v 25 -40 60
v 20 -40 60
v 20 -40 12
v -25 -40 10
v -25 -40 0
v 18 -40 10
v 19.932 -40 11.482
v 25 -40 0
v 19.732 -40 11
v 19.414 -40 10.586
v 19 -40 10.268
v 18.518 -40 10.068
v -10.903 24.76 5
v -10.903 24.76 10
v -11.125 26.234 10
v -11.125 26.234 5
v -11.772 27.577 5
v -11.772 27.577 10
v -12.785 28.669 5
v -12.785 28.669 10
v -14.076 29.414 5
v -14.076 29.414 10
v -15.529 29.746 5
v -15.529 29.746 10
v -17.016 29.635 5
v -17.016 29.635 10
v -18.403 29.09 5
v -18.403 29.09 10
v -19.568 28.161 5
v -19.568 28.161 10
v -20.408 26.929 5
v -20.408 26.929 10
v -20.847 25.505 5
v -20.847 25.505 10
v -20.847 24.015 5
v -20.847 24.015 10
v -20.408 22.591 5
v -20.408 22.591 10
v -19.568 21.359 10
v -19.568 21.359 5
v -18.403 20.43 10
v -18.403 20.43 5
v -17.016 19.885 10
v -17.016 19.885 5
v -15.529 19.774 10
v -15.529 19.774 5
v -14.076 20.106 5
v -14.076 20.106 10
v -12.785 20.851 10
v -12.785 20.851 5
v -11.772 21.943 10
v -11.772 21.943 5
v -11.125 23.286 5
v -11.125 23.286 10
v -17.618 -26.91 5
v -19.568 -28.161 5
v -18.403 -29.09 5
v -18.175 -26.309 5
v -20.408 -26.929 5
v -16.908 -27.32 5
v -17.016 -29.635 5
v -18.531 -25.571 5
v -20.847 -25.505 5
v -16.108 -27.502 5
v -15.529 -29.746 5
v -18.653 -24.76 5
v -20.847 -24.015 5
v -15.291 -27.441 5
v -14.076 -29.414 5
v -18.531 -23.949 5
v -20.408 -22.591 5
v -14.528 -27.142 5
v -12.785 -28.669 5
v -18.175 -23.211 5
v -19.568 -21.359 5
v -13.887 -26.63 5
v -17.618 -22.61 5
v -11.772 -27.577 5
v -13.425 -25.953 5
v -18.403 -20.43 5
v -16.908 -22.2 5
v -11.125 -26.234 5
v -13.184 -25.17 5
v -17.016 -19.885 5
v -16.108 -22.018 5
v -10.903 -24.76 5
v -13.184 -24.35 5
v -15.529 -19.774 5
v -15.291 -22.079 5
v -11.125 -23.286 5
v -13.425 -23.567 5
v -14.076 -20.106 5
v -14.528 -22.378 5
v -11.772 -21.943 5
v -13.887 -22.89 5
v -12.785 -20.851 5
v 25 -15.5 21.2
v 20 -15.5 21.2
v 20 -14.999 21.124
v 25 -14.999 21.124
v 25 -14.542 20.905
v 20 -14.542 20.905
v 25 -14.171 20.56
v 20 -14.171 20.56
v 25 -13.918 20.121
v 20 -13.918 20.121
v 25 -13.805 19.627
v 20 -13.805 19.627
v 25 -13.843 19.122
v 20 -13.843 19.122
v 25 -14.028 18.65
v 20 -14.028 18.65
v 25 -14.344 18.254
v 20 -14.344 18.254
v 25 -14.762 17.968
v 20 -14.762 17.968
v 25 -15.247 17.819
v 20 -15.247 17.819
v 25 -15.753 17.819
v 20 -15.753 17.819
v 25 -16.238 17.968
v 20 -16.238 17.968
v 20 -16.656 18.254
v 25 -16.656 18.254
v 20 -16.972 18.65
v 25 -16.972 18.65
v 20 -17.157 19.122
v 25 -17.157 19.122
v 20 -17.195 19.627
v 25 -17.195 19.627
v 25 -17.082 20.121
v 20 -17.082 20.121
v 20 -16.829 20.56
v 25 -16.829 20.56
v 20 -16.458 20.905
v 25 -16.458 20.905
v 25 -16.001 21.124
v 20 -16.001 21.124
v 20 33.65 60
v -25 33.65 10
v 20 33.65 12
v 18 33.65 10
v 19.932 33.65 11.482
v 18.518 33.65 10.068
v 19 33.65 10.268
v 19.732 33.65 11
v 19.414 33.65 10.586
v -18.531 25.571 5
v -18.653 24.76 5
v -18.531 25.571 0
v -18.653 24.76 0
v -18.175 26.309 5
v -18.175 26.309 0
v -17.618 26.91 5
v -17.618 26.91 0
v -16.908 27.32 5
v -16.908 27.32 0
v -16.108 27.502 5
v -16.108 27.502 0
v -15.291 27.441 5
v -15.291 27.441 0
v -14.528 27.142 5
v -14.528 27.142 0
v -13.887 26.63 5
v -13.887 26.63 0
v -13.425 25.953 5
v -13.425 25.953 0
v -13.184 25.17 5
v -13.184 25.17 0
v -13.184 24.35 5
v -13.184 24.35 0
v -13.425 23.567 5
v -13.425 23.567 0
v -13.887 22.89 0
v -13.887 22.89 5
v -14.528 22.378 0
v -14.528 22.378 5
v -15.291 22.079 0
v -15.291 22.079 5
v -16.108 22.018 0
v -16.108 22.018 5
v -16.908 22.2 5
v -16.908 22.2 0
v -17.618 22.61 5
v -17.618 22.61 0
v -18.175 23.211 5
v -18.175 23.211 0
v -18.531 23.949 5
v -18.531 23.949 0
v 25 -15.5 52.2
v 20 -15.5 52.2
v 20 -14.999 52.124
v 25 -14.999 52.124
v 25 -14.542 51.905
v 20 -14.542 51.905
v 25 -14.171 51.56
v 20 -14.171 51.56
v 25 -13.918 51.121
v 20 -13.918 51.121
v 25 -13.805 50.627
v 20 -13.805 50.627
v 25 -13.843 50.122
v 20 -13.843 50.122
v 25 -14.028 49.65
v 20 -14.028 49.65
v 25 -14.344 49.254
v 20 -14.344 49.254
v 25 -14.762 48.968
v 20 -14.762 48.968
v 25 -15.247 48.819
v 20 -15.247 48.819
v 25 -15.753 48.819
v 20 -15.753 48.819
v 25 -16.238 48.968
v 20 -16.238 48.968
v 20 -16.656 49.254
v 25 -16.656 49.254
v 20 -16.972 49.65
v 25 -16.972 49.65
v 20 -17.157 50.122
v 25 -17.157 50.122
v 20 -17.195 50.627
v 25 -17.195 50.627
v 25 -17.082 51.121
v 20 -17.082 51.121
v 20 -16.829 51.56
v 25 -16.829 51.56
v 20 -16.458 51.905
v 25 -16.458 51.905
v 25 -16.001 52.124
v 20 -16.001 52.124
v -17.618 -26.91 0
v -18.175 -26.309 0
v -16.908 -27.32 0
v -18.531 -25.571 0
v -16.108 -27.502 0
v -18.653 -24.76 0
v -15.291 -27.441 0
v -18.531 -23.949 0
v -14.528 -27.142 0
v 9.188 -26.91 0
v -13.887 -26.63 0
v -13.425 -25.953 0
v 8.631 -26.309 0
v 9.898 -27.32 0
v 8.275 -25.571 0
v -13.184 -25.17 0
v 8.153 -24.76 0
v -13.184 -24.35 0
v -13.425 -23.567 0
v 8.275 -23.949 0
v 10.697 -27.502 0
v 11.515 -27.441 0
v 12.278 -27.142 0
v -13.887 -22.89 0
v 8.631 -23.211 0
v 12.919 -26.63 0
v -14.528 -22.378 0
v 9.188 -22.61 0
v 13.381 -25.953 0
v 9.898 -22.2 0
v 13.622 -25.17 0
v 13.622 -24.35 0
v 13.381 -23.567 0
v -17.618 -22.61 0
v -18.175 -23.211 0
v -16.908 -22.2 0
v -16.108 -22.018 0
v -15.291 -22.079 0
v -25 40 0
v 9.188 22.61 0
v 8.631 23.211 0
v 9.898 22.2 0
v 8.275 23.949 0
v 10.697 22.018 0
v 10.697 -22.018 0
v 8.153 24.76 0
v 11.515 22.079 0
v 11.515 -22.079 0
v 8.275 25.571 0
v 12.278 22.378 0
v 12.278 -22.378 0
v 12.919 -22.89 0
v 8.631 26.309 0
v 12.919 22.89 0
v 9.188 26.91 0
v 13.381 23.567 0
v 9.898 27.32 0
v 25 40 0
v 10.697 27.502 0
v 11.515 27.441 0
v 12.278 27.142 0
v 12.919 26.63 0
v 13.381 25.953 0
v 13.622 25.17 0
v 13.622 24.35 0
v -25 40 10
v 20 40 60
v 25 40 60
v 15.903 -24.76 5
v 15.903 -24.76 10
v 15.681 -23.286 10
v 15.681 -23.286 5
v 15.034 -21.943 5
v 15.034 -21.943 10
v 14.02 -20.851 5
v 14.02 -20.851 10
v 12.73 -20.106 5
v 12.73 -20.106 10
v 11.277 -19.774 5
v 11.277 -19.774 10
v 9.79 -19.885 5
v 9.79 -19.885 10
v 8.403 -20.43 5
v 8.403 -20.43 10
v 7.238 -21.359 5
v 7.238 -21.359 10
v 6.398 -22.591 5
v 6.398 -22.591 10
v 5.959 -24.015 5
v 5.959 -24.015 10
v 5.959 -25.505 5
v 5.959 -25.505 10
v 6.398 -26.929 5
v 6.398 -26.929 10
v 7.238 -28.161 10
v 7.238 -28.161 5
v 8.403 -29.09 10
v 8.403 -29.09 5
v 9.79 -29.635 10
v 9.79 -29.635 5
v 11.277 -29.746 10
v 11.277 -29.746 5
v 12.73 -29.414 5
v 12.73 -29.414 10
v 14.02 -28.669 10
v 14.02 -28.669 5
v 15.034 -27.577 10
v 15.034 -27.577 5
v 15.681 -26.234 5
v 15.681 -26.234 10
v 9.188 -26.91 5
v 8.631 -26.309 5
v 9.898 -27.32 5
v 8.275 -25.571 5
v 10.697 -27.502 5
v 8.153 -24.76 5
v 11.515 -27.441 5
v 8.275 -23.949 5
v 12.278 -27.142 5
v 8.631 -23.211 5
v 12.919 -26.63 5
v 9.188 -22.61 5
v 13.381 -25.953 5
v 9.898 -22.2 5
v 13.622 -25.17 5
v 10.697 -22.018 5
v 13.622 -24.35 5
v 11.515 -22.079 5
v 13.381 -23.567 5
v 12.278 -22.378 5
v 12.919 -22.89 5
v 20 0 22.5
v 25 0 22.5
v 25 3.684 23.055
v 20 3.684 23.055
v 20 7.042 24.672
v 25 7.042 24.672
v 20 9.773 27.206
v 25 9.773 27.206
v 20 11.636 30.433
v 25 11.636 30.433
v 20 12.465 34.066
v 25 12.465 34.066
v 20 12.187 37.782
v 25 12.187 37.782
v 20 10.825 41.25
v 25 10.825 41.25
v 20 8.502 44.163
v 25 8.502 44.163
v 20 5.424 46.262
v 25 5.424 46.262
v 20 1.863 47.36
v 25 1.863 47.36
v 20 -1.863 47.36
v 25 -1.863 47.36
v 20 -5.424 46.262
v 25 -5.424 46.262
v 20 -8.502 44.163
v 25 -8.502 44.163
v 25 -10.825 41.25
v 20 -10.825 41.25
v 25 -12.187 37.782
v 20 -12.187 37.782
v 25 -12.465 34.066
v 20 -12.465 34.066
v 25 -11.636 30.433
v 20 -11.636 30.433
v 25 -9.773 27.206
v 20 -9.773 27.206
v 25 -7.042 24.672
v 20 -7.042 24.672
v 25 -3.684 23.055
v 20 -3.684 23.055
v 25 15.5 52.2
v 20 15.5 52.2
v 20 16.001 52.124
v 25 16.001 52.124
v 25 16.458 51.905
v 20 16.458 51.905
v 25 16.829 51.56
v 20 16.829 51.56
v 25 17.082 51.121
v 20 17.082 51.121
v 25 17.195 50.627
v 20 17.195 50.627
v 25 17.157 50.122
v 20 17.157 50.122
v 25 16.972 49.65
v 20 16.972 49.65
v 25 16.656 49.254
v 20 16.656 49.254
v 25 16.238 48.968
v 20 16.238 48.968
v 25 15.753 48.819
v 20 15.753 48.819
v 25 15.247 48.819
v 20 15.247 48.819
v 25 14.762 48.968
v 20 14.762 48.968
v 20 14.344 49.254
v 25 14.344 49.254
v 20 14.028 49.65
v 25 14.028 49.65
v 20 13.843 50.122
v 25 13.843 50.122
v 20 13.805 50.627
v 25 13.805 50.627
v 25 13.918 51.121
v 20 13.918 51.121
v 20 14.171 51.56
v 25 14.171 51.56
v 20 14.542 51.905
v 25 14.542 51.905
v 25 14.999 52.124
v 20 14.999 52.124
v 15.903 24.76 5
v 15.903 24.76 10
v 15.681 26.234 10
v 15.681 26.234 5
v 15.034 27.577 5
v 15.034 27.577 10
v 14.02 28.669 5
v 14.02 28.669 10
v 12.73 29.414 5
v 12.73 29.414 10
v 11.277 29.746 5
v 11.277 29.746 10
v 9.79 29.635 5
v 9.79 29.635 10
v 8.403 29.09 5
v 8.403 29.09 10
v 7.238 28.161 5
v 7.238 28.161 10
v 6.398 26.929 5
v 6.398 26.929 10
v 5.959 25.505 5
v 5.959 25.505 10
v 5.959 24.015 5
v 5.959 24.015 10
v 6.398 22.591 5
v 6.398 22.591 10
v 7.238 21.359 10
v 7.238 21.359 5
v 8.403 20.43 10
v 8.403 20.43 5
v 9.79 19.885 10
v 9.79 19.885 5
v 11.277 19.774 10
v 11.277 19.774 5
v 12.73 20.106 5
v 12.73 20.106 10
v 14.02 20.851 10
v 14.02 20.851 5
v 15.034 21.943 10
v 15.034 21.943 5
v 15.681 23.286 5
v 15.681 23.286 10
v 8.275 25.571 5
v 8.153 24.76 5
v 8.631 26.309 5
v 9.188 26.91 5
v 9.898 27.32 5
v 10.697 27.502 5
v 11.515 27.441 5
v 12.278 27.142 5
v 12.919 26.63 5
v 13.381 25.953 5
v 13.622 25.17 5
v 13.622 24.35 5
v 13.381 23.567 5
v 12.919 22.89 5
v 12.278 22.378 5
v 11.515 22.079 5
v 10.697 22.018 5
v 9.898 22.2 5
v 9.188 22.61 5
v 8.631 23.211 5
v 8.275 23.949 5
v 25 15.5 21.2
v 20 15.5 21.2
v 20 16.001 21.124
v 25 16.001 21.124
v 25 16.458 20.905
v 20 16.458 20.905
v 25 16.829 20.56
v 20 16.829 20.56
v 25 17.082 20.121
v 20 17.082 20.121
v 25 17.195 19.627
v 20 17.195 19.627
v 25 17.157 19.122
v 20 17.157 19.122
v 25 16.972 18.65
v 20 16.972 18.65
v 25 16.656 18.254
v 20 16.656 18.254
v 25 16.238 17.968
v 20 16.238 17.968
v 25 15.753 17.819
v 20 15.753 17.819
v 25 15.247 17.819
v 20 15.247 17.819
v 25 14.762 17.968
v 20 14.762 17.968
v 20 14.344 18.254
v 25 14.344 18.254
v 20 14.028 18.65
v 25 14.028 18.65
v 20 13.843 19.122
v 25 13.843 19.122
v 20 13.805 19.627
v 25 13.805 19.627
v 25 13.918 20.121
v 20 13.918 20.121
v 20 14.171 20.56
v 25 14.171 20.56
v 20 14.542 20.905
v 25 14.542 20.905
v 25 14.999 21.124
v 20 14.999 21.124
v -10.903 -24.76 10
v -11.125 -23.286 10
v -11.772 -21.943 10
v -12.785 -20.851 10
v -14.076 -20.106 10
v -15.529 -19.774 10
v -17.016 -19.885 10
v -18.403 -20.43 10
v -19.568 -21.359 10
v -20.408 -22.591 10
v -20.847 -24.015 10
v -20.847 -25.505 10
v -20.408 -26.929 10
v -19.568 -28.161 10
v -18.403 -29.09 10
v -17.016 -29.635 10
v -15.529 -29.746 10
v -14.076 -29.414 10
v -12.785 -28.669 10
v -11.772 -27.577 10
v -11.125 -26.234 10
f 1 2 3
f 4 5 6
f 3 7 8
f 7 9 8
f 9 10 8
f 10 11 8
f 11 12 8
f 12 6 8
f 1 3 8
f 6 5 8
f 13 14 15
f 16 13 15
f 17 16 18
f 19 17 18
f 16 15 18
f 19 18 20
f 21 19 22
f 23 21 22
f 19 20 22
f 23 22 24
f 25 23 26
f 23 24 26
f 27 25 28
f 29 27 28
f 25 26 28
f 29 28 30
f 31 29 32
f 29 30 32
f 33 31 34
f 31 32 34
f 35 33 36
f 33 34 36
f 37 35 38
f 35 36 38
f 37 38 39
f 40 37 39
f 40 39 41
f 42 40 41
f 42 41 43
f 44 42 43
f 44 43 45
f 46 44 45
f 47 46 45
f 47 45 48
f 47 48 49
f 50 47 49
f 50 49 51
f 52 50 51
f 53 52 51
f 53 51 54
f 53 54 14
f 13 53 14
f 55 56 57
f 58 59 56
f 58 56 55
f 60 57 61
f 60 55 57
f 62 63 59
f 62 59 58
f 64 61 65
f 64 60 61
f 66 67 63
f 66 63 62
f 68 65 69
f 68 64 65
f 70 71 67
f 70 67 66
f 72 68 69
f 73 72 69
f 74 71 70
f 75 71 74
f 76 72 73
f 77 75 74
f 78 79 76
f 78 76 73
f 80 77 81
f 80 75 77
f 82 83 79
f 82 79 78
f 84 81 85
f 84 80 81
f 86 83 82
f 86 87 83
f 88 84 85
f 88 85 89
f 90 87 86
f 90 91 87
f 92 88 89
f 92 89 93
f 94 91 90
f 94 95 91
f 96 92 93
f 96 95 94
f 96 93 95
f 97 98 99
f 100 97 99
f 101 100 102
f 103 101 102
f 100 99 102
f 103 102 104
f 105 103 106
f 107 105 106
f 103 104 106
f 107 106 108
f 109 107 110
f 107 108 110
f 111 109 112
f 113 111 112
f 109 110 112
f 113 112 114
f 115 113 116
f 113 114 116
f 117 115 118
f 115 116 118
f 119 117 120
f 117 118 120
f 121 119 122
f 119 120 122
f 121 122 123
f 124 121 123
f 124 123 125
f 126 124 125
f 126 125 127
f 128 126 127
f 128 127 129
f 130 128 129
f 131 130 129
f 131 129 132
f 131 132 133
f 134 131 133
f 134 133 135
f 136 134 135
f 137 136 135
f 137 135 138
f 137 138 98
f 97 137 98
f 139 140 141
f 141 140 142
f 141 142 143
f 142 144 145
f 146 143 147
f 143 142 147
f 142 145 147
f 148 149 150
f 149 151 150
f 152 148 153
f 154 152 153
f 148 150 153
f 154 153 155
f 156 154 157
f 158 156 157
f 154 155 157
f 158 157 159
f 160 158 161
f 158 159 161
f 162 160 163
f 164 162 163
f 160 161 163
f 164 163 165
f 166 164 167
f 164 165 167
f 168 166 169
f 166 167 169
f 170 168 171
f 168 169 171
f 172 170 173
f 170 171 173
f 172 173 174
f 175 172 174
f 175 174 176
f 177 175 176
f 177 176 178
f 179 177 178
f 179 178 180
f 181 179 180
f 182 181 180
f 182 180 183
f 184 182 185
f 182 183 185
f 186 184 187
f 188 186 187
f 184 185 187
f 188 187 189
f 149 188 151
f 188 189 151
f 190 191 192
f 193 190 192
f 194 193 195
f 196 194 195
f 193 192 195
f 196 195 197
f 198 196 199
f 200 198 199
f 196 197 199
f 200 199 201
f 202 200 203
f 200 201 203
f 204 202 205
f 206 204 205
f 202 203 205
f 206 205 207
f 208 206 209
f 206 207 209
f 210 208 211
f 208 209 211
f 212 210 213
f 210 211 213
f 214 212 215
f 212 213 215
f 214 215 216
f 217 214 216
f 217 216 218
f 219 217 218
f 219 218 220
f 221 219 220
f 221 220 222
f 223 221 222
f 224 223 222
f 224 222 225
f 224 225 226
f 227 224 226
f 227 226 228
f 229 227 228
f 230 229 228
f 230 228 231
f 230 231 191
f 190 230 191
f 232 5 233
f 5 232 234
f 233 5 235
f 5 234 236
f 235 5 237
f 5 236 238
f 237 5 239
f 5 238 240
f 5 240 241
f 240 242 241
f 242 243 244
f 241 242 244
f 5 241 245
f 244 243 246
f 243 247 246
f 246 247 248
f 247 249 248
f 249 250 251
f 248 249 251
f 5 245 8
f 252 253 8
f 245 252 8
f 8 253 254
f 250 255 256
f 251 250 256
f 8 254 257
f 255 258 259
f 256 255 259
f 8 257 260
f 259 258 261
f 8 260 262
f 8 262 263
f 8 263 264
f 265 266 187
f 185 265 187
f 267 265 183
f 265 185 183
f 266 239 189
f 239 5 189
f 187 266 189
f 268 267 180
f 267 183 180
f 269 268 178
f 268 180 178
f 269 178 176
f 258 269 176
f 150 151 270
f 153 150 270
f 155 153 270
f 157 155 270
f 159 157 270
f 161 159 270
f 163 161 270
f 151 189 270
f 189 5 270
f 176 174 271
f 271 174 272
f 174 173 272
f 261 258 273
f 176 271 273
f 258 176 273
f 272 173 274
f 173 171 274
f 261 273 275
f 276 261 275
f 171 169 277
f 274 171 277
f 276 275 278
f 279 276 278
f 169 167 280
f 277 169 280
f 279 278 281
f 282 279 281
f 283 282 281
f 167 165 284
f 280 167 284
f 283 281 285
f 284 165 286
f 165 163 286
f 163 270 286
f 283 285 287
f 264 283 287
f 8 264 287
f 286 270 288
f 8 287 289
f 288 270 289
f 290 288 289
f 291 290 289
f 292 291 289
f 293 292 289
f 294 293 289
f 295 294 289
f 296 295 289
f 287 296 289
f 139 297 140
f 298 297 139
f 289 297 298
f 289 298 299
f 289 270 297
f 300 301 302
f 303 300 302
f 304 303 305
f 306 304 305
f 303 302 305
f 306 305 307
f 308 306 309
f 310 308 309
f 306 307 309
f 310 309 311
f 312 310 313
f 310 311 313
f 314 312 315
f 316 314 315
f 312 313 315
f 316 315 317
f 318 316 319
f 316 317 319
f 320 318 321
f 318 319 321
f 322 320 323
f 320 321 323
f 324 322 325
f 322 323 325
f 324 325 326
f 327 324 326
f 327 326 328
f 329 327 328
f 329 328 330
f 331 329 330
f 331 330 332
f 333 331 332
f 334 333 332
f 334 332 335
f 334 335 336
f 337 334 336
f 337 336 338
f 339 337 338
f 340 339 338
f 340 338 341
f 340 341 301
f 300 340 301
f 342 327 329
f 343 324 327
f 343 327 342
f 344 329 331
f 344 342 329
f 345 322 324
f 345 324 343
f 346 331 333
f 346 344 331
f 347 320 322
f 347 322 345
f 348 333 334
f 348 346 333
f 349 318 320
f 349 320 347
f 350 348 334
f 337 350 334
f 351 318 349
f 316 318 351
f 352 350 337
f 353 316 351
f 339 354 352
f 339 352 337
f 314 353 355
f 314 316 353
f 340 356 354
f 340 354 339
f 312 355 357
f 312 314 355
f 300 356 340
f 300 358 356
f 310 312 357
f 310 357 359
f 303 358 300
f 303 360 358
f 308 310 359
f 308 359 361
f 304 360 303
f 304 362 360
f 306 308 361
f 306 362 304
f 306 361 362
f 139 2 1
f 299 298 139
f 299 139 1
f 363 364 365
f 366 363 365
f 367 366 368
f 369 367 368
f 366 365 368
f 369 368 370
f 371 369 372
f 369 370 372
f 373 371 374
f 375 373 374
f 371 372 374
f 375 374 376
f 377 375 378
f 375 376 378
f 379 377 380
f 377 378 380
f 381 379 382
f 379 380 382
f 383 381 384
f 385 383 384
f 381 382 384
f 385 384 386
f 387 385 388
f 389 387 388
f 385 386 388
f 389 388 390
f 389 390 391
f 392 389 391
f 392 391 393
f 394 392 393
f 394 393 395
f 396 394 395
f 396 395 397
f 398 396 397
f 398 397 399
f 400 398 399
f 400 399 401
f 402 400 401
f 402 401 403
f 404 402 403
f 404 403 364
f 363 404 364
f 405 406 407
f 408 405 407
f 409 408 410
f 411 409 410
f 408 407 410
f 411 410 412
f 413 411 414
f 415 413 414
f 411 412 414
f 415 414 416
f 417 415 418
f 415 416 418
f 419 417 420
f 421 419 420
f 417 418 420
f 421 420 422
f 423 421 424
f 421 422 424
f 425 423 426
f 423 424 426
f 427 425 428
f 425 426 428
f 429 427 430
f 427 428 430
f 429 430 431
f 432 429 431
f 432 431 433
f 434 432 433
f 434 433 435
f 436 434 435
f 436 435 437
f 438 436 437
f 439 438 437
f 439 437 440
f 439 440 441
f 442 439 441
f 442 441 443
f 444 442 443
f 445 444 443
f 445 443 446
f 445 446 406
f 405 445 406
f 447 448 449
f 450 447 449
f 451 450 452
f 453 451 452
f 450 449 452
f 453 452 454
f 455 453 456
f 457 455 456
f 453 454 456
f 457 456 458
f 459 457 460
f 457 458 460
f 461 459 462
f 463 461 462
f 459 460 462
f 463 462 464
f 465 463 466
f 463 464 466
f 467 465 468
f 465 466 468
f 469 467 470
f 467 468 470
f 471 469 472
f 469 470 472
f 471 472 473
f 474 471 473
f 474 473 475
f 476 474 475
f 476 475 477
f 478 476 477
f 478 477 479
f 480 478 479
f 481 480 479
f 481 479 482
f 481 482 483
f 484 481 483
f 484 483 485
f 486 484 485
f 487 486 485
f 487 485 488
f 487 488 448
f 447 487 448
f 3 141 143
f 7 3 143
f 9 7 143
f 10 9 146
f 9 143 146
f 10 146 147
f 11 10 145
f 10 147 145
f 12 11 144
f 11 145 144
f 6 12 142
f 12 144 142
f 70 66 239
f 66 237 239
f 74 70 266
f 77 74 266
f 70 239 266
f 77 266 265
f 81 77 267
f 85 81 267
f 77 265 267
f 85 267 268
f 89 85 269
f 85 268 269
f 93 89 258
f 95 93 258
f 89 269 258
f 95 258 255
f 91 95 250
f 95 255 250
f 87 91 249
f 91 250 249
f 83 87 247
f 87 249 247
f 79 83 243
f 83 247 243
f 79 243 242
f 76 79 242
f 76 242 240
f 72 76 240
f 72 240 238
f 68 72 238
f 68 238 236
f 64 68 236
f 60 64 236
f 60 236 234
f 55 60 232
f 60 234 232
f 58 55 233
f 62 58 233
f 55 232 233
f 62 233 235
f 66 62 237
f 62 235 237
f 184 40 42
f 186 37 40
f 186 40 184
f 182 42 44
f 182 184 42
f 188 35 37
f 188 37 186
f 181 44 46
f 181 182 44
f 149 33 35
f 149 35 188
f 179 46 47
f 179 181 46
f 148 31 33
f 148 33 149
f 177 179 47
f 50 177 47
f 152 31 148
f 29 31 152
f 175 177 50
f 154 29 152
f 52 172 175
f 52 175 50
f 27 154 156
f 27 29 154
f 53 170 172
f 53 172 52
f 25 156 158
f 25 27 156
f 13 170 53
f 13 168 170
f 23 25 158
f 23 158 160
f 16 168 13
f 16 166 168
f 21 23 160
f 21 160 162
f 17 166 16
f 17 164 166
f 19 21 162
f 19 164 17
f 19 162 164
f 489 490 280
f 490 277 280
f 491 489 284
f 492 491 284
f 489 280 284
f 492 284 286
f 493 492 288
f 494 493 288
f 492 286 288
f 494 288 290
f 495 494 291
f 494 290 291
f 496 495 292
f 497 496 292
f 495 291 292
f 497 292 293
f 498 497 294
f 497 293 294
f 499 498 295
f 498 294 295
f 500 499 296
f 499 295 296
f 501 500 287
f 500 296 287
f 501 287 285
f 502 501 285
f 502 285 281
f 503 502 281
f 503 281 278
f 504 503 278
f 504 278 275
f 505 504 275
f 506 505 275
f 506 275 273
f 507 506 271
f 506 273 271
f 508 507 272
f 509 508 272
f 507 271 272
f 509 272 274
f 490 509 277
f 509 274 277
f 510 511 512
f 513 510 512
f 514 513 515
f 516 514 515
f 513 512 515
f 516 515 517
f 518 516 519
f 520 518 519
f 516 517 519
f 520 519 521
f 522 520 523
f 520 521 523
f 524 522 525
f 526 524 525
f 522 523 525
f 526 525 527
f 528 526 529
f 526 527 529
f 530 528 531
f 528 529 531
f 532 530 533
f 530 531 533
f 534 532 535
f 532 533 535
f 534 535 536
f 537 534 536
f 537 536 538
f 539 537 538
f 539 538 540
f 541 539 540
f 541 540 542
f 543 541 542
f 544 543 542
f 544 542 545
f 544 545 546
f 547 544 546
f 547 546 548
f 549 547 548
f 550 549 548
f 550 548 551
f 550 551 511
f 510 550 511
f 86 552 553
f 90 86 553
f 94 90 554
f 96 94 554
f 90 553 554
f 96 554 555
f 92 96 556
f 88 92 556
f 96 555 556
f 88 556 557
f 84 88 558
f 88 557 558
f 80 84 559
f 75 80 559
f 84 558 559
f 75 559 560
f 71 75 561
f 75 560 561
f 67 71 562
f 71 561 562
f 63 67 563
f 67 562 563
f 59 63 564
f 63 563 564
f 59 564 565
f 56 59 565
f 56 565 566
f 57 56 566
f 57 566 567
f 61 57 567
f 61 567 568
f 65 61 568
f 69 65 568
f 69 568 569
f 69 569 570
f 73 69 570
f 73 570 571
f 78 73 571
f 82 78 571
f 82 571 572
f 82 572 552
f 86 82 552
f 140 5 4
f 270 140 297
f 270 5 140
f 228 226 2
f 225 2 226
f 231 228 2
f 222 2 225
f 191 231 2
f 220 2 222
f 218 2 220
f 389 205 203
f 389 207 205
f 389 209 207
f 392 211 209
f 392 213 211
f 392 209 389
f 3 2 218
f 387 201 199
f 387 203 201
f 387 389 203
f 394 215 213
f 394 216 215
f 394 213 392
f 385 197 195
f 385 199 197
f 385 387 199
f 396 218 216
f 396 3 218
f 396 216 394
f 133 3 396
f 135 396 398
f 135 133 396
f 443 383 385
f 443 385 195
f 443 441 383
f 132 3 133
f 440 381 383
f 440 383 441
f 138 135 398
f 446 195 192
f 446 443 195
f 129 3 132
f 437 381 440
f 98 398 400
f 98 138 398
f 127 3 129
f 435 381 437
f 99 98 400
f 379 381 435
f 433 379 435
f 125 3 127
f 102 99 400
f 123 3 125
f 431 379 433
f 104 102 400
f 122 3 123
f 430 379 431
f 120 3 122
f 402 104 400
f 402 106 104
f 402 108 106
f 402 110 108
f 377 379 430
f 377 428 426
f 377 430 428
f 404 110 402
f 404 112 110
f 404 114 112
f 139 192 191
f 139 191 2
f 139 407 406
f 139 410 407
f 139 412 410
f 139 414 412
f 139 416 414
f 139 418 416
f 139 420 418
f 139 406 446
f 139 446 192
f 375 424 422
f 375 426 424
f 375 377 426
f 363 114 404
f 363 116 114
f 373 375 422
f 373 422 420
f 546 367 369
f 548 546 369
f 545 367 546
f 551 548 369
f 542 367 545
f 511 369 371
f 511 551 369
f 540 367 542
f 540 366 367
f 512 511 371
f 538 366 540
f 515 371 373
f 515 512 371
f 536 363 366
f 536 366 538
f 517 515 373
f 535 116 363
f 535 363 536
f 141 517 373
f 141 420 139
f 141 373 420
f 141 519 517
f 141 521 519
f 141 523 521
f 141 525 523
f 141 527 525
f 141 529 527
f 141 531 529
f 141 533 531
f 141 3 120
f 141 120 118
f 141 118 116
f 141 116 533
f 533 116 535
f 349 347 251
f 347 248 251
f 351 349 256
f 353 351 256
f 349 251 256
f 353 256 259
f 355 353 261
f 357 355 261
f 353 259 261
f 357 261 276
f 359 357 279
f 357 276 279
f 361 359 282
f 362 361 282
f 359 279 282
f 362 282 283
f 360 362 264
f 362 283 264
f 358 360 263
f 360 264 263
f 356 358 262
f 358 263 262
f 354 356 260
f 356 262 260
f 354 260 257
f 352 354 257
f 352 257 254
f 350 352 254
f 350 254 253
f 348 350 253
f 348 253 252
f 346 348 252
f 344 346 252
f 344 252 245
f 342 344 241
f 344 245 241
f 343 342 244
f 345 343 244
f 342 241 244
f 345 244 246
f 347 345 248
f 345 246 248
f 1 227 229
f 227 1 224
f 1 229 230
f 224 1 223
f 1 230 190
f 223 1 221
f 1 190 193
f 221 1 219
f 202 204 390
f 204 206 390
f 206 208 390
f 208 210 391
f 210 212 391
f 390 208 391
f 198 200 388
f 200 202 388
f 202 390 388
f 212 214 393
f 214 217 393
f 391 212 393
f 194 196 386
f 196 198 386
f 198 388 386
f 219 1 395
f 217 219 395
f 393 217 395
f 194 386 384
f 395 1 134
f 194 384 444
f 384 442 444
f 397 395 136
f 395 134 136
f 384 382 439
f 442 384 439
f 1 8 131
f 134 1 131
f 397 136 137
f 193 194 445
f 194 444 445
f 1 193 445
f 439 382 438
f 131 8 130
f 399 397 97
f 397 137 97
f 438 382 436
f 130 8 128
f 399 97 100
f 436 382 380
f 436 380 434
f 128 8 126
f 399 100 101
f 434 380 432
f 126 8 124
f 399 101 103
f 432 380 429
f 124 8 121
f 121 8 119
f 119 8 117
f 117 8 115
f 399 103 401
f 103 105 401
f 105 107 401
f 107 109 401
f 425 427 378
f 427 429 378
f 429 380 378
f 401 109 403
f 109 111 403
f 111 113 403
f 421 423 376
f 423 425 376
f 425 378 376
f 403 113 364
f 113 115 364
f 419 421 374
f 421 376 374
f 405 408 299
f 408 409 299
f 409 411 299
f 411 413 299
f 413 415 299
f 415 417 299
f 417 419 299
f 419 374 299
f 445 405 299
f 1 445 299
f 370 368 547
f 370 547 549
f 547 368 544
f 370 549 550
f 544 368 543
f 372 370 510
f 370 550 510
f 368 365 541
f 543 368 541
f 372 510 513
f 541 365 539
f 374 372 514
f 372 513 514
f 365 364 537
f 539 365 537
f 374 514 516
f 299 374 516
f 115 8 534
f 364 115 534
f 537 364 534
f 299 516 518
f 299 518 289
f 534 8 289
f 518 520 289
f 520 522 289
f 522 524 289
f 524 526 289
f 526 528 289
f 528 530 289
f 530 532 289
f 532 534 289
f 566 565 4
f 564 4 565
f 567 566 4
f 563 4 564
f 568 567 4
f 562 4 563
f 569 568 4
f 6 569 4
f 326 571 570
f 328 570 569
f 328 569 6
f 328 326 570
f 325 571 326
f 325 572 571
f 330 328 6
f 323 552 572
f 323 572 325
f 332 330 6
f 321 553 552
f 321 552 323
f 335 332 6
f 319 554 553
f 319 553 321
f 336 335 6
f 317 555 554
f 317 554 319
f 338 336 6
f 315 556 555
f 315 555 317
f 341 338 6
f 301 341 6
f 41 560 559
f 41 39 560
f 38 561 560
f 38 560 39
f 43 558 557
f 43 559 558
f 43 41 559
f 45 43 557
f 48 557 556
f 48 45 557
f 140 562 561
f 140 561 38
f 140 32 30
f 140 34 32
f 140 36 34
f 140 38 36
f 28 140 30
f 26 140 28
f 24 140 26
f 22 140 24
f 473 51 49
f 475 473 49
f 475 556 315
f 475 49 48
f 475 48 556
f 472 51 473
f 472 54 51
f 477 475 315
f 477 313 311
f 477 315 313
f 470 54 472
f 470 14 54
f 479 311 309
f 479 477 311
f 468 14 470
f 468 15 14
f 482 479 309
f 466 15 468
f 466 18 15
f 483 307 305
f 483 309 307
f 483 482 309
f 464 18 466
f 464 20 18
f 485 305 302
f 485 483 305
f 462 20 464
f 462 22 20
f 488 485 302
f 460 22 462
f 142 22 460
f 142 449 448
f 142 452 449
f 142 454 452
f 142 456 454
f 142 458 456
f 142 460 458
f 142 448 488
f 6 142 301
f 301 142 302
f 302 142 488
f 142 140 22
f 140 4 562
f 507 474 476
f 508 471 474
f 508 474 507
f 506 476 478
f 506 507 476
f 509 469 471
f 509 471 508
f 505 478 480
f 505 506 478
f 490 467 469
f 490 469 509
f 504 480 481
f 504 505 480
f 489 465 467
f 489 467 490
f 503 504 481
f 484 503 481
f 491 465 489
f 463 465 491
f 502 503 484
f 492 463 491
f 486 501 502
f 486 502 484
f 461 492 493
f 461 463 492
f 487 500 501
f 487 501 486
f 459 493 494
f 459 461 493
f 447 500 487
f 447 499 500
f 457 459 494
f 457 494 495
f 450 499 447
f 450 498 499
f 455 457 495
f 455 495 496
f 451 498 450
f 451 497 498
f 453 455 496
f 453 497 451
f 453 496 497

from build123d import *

# Parameters (mm, degrees)
SKETCH1_W                      = 50
SKETCH1_H                      = 80
BOSS_EXTRUDE1_DEPTH            = 10
SKETCH2_W                      = 5
SKETCH2_H                      = 80
BOSS_EXTRUDE2_DEPTH            = 50
SKETCH3_R                      = 12.5
CUT_EXTRUDE1_DEPTH             = 88.749643874
M3_CLEARANCE_HOLE1_D           = 3.4
CBORE_FOR_M5_SHCS1_D           = 5.5
CBORE_FOR_M5_SHCS1_CBORE_D     = 10
CBORE_FOR_M5_SHCS1_CBORE_DEPTH = 5
FILLET11_R                     = 2
BOSS_EXTRUDE3_DEPTH            = 6.35


with BuildPart() as part:
    # Sketch1 → Boss-Extrude1 (new body)
    with BuildSketch(Plane.XY):
        Rectangle(SKETCH1_W, SKETCH1_H)
    extrude(amount=BOSS_EXTRUDE1_DEPTH)

    # Sketch2 → Boss-Extrude2 (add)
    with BuildSketch(Plane.XY.offset(10)):
        with Locations((22.5, 0)):
            Rectangle(SKETCH2_W, SKETCH2_H)
    extrude(amount=BOSS_EXTRUDE2_DEPTH)

    # Sketch3 → Cut-Extrude1 (cut, through all)
    with BuildSketch(Plane(origin=(25, 0, 0), x_dir=(0, 0, -1), z_dir=(1, 0, 0))):
        with Locations((-35, 0)):
            Circle(SKETCH3_R)
    extrude(amount=-CUT_EXTRUDE1_DEPTH, mode=Mode.SUBTRACT)

    # M3 Clearance Hole1 (through all)
    with Locations(Plane(origin=(25, 0, 0), x_dir=(0, 0, -1), z_dir=(1, 0, 0))):
        with Locations((-50.5, -15.5), (-35, 0), (-50.5, 15.5), (-19.5, -15.5), (-19.5, 15.5)):
            Hole(M3_CLEARANCE_HOLE1_D / 2)

    # CBORE for M5 SHCS1 (through all)
    with Locations(Plane.XY.offset(10)):
        with Locations((-15.902931391, 24.76), (10.902931391, 24.76), (-15.902931391, -24.76), (10.902931391, -24.76)):
            CounterBoreHole(CBORE_FOR_M5_SHCS1_D / 2, CBORE_FOR_M5_SHCS1_CBORE_D / 2, CBORE_FOR_M5_SHCS1_CBORE_DEPTH)

    # Fillet11
    fillet11_edges = [part.edges().sort_by_distance(p)[0] for p in [
        (20, 0, 10),
    ]]
    fillet(fillet11_edges, radius=FILLET11_R)

    # Sketch8 → Boss-Extrude3 (add)
    with BuildSketch(Plane(origin=(0, 40, 0), x_dir=(1, 0, 0), z_dir=(0, 1, 0))):
        Polygon((-25, -10), (20, -60), (20, -10), align=None)
    extrude(amount=-BOSS_EXTRUDE3_DEPTH)


solid = part.part
